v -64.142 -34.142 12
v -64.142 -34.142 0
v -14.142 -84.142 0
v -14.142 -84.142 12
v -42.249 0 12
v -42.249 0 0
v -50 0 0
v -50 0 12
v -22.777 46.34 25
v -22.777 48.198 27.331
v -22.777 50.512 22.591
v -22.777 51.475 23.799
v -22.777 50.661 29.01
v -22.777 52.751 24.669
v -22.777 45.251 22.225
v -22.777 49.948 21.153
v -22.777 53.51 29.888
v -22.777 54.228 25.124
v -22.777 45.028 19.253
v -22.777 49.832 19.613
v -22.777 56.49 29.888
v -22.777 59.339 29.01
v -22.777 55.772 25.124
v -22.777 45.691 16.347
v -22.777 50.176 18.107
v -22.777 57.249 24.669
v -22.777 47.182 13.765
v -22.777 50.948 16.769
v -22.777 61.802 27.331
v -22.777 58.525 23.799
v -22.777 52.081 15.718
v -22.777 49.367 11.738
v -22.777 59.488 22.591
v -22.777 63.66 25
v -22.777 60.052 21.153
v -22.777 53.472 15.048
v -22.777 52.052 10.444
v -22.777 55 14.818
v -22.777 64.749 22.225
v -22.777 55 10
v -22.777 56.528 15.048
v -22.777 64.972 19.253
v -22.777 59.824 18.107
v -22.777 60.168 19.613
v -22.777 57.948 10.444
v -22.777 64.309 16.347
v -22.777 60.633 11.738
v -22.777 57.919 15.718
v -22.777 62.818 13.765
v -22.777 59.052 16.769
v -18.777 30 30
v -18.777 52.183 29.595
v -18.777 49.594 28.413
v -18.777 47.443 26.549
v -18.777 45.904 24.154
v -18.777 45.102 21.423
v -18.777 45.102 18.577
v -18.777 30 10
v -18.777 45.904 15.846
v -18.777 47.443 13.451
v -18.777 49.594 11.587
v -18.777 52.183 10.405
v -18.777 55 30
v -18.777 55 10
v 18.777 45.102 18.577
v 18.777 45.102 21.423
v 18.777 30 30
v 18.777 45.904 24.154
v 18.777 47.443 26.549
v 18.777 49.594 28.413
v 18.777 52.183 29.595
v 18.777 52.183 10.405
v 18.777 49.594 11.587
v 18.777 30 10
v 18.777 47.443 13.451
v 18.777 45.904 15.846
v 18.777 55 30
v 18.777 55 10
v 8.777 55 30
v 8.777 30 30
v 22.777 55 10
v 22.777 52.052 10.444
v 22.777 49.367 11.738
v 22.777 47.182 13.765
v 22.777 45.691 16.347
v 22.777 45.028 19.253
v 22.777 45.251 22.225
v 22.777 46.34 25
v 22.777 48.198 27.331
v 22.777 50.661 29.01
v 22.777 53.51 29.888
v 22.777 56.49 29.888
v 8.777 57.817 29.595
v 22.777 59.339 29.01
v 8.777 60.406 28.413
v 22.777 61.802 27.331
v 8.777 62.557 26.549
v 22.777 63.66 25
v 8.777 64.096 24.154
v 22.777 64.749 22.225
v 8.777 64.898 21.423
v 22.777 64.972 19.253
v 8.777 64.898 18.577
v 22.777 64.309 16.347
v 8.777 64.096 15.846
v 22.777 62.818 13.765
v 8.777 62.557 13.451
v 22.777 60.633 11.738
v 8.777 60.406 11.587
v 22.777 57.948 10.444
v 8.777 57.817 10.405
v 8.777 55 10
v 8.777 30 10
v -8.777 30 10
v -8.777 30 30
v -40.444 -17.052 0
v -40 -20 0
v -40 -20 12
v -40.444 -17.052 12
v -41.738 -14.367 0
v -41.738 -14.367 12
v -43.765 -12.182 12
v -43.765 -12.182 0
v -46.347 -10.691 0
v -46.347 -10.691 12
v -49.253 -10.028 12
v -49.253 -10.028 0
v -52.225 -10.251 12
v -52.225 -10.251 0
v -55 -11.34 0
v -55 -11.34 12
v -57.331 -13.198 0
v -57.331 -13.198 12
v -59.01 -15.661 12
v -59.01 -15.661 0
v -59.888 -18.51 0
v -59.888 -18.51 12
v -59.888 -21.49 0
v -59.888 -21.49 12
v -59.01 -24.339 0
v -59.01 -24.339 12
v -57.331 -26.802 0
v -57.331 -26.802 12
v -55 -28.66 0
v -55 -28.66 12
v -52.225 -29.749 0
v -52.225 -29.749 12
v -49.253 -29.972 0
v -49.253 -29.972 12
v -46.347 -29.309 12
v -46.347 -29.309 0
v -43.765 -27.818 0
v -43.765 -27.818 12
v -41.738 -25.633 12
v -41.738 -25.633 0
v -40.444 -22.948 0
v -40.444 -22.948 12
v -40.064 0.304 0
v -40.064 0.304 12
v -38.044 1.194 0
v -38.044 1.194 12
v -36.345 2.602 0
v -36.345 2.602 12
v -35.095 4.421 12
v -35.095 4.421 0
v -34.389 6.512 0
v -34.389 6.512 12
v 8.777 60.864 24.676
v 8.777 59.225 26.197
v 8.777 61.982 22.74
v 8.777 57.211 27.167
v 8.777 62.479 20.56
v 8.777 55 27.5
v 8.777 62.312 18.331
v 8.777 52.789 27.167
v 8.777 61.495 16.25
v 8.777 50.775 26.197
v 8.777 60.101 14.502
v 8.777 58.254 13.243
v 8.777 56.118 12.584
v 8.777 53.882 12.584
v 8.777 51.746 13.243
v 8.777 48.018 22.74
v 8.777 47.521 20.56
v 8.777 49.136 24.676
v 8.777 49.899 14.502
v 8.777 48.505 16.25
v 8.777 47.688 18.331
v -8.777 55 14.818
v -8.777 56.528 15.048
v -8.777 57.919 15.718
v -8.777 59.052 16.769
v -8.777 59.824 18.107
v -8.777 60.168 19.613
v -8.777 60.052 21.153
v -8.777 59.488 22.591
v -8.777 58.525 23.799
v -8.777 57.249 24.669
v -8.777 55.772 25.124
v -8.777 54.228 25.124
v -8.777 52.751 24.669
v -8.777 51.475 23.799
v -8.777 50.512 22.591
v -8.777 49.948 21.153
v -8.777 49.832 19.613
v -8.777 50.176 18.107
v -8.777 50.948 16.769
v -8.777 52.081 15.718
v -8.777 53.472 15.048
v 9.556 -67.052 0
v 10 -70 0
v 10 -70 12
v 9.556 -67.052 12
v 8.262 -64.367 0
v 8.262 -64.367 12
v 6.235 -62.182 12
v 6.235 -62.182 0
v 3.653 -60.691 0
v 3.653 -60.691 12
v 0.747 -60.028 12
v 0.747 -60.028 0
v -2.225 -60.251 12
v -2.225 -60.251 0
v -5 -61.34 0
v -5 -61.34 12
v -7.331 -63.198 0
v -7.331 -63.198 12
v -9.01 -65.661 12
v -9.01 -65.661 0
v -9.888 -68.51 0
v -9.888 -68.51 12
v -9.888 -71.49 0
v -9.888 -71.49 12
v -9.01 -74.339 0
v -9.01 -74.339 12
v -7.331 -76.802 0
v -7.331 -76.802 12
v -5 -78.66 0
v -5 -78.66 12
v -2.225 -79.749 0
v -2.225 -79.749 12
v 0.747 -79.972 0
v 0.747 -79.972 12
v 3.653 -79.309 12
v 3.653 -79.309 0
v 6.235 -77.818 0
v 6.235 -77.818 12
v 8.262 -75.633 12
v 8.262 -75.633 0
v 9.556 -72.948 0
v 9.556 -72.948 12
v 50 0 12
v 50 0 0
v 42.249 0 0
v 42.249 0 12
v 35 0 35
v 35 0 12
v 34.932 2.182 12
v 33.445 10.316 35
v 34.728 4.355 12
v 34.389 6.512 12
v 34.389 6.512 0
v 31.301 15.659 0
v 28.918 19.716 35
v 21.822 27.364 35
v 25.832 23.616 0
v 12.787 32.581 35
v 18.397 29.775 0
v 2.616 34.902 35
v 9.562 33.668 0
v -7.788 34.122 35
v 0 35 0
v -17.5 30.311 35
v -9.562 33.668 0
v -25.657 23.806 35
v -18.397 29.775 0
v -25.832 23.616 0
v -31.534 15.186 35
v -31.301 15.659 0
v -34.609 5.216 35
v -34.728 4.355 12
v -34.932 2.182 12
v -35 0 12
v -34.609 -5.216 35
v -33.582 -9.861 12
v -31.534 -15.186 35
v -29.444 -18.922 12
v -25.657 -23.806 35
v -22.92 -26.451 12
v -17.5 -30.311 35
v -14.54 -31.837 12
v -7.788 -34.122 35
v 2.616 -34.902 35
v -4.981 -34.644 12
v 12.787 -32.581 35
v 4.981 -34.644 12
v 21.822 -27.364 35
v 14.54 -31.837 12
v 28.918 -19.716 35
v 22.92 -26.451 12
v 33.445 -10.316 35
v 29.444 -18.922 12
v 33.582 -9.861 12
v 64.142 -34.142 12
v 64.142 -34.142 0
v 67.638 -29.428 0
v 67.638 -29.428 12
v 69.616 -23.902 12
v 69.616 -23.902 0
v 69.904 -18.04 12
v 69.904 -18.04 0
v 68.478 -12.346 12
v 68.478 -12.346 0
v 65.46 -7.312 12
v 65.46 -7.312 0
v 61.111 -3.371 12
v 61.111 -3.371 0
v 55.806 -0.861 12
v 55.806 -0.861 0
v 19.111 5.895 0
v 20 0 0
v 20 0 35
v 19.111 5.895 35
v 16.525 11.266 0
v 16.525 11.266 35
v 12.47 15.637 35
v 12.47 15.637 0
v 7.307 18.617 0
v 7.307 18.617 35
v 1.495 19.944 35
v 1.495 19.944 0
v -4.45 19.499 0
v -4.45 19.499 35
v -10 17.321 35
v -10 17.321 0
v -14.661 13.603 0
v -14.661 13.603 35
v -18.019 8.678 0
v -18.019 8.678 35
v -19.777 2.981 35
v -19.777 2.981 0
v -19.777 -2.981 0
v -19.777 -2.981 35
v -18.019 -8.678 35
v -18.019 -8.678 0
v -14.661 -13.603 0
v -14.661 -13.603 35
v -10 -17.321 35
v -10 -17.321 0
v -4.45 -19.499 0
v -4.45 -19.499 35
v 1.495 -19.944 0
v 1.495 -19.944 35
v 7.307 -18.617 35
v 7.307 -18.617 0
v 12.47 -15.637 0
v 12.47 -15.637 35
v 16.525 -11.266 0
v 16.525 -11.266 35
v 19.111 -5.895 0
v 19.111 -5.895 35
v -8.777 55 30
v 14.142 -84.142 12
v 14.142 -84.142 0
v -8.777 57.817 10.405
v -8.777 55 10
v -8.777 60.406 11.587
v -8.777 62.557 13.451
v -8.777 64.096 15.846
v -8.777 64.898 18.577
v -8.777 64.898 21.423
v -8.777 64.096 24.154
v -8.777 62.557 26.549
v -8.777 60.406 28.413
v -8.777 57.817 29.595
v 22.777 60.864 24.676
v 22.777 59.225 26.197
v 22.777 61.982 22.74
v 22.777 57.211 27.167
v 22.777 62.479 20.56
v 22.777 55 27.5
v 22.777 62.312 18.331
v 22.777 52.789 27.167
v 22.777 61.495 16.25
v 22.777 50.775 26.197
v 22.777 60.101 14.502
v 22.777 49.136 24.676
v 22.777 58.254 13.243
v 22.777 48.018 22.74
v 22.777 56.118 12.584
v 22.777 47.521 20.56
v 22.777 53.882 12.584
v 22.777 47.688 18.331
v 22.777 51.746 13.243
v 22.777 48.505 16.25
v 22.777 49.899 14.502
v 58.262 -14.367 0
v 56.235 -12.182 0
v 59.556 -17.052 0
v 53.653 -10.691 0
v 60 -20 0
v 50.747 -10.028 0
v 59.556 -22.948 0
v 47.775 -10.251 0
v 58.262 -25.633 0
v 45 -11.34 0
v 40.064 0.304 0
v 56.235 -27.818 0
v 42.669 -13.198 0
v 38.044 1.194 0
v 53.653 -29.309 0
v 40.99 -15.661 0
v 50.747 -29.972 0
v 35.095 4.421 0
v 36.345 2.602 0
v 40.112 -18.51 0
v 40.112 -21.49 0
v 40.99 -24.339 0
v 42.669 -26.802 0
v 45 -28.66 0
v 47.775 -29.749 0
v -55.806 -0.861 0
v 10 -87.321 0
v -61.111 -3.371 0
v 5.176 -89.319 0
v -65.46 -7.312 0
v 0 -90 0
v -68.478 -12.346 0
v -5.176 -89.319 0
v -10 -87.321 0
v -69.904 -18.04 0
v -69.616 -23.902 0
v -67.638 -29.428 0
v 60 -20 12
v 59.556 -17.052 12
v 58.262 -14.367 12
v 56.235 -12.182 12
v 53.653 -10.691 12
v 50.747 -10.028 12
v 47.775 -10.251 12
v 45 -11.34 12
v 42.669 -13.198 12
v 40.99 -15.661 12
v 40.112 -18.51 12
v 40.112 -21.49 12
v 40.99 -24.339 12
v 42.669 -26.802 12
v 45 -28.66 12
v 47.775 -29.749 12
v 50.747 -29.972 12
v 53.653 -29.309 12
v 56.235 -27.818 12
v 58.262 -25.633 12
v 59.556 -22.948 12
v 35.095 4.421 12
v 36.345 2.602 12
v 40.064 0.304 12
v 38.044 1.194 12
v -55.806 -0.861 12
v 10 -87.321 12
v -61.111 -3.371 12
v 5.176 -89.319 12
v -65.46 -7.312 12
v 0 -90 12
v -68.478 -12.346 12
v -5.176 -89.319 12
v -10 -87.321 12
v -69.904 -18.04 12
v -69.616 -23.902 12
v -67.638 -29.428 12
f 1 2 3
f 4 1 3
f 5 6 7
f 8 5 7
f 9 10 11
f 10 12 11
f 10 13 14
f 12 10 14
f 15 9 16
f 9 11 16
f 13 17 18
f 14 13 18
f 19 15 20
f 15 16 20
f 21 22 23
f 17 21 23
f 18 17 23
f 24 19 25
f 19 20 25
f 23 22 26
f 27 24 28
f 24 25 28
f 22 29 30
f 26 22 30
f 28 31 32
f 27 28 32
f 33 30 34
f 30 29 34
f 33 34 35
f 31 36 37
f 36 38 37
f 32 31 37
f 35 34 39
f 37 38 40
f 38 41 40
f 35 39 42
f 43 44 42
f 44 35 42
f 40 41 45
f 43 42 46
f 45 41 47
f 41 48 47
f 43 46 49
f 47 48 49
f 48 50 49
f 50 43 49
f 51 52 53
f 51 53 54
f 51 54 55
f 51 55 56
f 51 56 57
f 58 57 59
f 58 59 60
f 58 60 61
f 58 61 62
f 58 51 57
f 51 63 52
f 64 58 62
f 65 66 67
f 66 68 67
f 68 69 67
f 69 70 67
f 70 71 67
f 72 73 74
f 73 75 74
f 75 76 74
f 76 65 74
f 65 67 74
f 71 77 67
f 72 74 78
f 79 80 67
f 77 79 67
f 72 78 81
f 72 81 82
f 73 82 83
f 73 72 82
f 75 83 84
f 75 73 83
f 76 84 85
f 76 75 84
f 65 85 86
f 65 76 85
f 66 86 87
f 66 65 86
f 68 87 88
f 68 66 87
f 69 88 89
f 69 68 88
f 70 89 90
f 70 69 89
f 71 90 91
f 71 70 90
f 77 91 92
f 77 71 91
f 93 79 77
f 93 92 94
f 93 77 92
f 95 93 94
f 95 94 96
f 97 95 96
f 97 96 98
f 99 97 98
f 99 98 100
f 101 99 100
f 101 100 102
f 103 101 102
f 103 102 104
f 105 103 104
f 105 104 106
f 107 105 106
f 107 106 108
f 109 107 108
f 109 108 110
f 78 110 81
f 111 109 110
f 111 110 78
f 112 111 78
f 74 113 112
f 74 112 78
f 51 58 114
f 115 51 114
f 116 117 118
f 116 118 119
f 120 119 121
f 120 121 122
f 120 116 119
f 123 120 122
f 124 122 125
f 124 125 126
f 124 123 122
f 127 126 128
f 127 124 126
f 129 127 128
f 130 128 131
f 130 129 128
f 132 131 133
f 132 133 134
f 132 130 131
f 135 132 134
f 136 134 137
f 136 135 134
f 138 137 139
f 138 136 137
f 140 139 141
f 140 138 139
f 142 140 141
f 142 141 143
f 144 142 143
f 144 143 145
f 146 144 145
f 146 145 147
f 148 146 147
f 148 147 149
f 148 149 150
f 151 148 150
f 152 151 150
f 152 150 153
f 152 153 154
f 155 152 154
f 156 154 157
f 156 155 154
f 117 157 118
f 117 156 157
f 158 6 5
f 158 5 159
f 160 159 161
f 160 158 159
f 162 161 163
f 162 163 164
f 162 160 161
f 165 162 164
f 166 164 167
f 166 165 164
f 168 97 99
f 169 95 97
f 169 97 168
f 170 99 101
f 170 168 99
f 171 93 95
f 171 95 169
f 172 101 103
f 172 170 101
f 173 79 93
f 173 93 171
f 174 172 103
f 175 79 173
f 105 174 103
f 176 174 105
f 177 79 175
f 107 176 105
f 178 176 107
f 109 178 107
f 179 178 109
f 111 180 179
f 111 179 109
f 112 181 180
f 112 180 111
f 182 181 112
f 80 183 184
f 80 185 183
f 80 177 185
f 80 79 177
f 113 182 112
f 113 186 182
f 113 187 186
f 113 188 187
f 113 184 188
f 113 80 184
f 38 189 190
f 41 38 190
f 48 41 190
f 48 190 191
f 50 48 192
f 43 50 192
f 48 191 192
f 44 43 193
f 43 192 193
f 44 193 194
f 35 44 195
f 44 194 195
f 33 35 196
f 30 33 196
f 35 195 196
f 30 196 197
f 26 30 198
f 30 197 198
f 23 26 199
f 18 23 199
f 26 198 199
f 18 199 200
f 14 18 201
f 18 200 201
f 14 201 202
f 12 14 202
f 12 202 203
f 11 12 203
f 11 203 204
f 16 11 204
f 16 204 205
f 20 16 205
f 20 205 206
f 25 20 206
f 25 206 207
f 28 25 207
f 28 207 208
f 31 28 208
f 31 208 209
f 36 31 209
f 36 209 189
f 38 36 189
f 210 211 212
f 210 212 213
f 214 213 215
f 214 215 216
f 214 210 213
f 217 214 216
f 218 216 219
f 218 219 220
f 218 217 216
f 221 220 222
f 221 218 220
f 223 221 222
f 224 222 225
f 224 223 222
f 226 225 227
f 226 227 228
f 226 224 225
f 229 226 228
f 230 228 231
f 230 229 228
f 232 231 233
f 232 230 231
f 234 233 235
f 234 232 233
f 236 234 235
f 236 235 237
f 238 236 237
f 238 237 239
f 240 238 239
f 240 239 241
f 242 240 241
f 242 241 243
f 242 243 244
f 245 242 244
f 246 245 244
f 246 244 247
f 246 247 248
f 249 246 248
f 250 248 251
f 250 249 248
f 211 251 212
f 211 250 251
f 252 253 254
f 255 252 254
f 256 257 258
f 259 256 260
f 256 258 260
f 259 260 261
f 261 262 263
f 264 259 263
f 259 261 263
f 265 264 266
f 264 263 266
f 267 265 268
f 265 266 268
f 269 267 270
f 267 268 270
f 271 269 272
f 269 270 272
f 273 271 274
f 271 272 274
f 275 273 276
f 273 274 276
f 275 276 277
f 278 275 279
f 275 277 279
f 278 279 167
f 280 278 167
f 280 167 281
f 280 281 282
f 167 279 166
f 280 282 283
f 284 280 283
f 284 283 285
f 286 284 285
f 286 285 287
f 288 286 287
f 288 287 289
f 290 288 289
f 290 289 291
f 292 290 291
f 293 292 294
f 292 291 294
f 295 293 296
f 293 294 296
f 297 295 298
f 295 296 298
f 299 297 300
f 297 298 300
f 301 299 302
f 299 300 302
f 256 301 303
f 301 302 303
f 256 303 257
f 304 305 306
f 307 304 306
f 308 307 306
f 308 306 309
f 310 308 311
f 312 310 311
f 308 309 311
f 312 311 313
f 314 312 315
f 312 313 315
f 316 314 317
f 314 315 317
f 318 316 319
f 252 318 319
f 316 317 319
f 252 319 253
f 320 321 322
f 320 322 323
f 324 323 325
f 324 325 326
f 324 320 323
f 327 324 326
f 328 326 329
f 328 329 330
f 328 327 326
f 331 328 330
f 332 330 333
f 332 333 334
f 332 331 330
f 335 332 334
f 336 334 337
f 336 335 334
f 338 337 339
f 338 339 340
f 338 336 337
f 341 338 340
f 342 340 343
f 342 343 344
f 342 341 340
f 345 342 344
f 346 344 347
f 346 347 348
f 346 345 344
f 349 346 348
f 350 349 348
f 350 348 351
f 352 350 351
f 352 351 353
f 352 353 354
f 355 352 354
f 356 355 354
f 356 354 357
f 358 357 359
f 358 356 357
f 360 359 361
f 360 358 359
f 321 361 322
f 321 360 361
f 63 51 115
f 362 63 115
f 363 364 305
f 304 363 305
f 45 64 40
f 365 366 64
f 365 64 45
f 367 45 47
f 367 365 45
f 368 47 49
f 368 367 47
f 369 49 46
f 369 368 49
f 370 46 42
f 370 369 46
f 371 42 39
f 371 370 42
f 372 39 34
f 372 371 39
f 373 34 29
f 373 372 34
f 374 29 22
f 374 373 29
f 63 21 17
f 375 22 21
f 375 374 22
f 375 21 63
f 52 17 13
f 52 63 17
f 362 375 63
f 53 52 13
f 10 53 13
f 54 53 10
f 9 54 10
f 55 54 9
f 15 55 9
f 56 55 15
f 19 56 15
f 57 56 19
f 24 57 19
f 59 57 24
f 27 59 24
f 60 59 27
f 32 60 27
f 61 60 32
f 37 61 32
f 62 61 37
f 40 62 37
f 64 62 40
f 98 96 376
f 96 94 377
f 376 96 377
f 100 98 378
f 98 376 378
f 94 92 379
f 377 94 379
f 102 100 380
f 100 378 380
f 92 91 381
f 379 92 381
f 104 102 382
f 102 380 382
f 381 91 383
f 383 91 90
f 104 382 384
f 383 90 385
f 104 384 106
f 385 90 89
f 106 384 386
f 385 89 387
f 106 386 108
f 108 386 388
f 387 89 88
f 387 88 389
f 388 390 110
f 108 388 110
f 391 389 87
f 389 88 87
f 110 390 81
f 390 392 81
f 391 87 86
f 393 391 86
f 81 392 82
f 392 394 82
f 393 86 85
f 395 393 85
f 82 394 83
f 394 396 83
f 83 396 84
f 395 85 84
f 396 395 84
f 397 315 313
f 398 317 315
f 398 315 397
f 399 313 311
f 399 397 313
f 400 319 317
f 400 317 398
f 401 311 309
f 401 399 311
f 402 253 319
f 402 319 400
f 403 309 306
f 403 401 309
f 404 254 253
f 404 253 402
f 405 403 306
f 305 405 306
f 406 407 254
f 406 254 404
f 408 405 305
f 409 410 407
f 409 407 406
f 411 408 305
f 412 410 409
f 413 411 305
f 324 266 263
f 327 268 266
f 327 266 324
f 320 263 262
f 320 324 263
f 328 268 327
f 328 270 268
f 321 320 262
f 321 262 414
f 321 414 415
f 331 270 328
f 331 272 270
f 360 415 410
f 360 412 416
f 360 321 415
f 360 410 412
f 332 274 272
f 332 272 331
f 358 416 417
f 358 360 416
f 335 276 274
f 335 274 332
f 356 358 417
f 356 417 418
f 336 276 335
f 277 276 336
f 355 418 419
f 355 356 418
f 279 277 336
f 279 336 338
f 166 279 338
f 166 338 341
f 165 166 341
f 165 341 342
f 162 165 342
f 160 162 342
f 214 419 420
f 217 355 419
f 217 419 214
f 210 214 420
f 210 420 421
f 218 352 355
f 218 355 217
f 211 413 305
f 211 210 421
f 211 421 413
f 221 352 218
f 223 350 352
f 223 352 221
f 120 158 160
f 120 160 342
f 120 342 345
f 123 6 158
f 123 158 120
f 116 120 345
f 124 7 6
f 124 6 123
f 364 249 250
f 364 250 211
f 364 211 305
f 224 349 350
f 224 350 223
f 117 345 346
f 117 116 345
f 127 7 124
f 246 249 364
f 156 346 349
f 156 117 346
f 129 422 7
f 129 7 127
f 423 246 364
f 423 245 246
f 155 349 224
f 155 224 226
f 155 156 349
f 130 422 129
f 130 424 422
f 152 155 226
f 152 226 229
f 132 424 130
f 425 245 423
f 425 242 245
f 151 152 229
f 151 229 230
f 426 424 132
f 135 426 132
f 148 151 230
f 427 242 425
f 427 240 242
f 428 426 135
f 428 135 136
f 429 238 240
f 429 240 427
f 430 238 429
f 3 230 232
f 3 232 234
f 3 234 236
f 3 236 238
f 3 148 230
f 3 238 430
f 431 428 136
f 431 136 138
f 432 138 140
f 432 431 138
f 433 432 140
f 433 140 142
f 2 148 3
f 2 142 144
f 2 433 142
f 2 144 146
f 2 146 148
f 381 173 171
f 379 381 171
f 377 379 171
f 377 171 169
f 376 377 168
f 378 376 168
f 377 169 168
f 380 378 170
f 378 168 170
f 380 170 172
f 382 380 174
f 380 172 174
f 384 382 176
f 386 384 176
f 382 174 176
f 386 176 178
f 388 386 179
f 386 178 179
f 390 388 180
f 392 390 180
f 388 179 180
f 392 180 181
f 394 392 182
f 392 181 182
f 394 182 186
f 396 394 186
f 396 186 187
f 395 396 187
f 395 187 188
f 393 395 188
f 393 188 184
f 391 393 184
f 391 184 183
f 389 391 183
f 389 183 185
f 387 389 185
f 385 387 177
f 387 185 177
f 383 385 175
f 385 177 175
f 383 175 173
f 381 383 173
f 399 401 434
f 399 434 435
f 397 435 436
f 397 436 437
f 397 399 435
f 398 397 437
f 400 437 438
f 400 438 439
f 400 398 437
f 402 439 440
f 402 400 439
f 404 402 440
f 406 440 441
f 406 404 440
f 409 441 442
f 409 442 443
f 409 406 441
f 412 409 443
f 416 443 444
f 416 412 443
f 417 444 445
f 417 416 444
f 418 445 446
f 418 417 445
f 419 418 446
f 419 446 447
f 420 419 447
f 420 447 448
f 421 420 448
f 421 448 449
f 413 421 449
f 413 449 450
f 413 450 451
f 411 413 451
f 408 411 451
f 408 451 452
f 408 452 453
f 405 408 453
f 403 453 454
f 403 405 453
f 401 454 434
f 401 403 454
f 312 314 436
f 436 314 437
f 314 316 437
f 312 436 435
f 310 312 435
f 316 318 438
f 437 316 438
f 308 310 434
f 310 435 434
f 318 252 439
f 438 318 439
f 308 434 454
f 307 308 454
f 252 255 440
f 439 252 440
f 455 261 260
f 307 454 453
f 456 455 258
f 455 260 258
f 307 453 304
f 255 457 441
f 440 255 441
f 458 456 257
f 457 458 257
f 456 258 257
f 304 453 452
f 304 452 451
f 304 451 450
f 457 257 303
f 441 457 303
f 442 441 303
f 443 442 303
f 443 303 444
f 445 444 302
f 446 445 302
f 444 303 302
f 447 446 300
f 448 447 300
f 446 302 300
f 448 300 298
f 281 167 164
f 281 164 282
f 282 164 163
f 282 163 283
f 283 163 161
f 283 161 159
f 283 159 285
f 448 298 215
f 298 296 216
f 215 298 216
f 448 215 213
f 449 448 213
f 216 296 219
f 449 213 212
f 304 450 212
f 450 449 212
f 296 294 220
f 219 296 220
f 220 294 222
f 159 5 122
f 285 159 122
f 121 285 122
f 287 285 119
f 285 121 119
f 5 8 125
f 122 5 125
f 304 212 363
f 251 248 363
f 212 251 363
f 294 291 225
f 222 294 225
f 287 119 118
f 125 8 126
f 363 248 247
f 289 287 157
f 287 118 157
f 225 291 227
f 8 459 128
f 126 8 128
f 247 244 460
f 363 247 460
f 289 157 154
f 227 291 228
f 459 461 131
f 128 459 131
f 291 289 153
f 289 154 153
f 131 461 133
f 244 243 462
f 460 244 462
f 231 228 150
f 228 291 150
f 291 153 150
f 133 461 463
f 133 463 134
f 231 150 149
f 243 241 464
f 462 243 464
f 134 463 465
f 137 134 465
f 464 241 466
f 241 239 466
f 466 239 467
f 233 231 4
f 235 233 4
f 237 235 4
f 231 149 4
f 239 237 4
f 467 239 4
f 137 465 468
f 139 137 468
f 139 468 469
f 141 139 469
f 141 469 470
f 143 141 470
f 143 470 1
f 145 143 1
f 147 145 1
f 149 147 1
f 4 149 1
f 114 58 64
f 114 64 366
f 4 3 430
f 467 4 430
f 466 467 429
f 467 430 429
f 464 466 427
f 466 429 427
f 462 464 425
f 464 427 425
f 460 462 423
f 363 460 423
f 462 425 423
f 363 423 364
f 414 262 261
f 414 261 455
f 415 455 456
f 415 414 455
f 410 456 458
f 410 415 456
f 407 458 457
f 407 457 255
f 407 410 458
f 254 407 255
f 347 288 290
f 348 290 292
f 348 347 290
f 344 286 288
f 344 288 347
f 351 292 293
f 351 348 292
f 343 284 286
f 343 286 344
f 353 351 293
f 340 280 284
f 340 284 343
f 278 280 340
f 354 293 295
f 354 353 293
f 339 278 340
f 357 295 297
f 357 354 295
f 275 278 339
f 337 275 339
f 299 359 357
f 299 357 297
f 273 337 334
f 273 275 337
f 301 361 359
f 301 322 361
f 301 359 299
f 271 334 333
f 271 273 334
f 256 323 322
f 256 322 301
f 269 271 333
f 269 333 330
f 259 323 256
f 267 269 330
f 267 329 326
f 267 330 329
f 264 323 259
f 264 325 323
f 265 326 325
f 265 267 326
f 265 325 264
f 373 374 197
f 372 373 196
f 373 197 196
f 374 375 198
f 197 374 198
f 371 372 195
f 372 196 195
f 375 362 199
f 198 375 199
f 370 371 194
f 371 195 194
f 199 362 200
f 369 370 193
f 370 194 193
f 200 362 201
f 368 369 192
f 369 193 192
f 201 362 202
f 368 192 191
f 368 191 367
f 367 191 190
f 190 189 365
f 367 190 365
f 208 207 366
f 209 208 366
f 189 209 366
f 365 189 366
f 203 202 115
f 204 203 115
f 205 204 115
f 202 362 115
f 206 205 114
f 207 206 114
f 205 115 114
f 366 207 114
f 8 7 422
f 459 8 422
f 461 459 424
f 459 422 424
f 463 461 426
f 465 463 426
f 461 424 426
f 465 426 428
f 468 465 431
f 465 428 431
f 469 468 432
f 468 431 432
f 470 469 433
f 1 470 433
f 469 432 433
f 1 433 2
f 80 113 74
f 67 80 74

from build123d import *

# Parameters (mm, degrees)
ESQUISSE1_R             = 35
ESQUISSE1_R_2           = 20
BOSS_EXTRU_1_DEPTH      = 35
ESQUISSE2_R             = 10
BOSS_EXTRU_2_DEPTH      = 12
CONG_1_R                = 8
ESQUISSE4_W             = 10
ESQUISSE4_H             = 20
BOSS_EXTRU_3_DEPTH      = 25
BOSS_EXTRU_3_2_DEPTH    = 25
ESQUISSE6_R             = 10
BOSS_EXTRU_4_DEPTH      = 14
ESQUISSE8_R             = 5.182281133
ENL_V_MAT_EXTRU_1_DEPTH = 125.622425432
ESQUISSE14_R            = 10
BOSS_EXTRU_5_DEPTH      = 14
ESQUISSE15_R            = 7.5
ENL_V_MAT_EXTRU_2_DEPTH = 14


with BuildPart() as part:
    # Esquisse1 → Boss.-Extru.1 (new body)
    with BuildSketch(Plane.XY):
        Circle(ESQUISSE1_R)
        Circle(ESQUISSE1_R_2, mode=Mode.SUBTRACT)
    extrude(amount=BOSS_EXTRU_1_DEPTH)

    # Esquisse2 → Boss.-Extru.2 (add)
    with BuildSketch(Plane.XY):
        with BuildLine():
            Line((14.142135624, -84.142135624), (64.142135624, -34.142135624))
            ThreePointArc((64.142135624, -34.142135624), (68.47759065, -12.346331353), (50, 0))
            Line((50, 0), (35, 0))
            ThreePointArc((35, 0), (0, -35), (-35, 0))
            Line((-35, 0), (-50, 0))
            ThreePointArc((-50, 0), (-68.47759065, -12.346331353), (-64.142135624, -34.142135624))
            Line((-64.142135624, -34.142135624), (-14.142135624, -84.142135624))
            ThreePointArc((-14.142135624, -84.142135624), (0, -90), (14.142135624, -84.142135624))
        make_face()
        with Locations((50, -20)):
            Circle(ESQUISSE2_R, mode=Mode.SUBTRACT)
        with Locations((0, -70)):
            Circle(ESQUISSE2_R, mode=Mode.SUBTRACT)
        with Locations((-50, -20)):
            Circle(ESQUISSE2_R, mode=Mode.SUBTRACT)
    extrude(amount=BOSS_EXTRU_2_DEPTH)

    # Congé1
    # the kernel refuses this fillet: 8 mm, written as the material it adds along each edge
    with BuildSketch(Plane(origin=(35, 0, 0), x_dir=(-0.09343195829454301, 0.9956256671908608, 0), z_dir=(0, 0, 1))) as cong_1_piece_1:
        with BuildLine():
            CenterArc((7.287692747, -7.965005338), CONG_1_R, 95.361076208, 79.277847584)
            Line((-0.677312591, -7.217549671), (0, 0))
            ThreePointArc((0, 0), (3.27011854, -0.153101648), (6.540237081, 0))
        make_face()
    extrude(amount=12)
    with BuildSketch(Plane(origin=(-35, 0, 0), x_dir=(0.093431958294544, 0.9956256671908608, 0), z_dir=(0, 0, 1))) as cong_1_piece_2:
        with BuildLine():
            CenterArc((7.287692747, 7.965005338), CONG_1_R, 185.361076208, 79.277847584)
            Line((-0.677312591, 7.217549671), (0, 0))
            ThreePointArc((0, 0), (3.27011854, 0.153101648), (6.540237081, 0))
        make_face()
    extrude(amount=12)


with BuildPart() as body_2:
    # Esquisse4 → Boss.-Extru.3 (new body)
    with BuildSketch(Plane(origin=(0, 30, 0), x_dir=(1, 0, 0), z_dir=(0, 1, 0))):
        with Locations((13.776575964, -20)):
            Rectangle(ESQUISSE4_W, ESQUISSE4_H)
    extrude(amount=BOSS_EXTRU_3_DEPTH)

    # Esquisse14 → Boss.-Extru.5 (add)
    with BuildSketch(Plane.ZY.offset(-8.776575964)):
        with Locations(Location((20, 55, 0), (0, 0, 180))):
            Circle(ESQUISSE14_R)
    extrude(amount=-BOSS_EXTRU_5_DEPTH)

    # Esquisse15 → Enlèv. mat.-Extru.2 (cut)
    with BuildSketch(Plane.ZY.offset(-8.776575964)):
        with Locations((20, 55)):
            Circle(ESQUISSE15_R)
    extrude(amount=-ENL_V_MAT_EXTRU_2_DEPTH, mode=Mode.SUBTRACT)


with BuildPart() as body_3:
    # Esquisse4 → Boss.-Extru.3 2 (new body)
    with BuildSketch(Plane(origin=(0, 30, 0), x_dir=(1, 0, 0), z_dir=(0, 1, 0))):
        with Locations((-13.776575964, -20)):
            Rectangle(ESQUISSE4_W, ESQUISSE4_H)
    extrude(amount=BOSS_EXTRU_3_2_DEPTH)

    # Esquisse6 → Boss.-Extru.4 (add)
    with BuildSketch(Plane(origin=(-8.776575964, 0, 0), x_dir=(0, 0, -1), z_dir=(1, 0, 0))):
        with Locations((-20, 55)):
            Circle(ESQUISSE6_R)
    extrude(amount=-BOSS_EXTRU_4_DEPTH)

    # Esquisse8 → Enlèv. mat.-Extru.1 (cut, through all)
    with BuildSketch(Plane(origin=(-8.776575964, 0, 0), x_dir=(0, 0, -1), z_dir=(1, 0, 0))):
        with Locations((-20, 55)):
            Circle(ESQUISSE8_R)
    extrude(amount=-ENL_V_MAT_EXTRU_1_DEPTH, mode=Mode.SUBTRACT)


solid = Compound([part.part, body_2.part, body_3.part])
